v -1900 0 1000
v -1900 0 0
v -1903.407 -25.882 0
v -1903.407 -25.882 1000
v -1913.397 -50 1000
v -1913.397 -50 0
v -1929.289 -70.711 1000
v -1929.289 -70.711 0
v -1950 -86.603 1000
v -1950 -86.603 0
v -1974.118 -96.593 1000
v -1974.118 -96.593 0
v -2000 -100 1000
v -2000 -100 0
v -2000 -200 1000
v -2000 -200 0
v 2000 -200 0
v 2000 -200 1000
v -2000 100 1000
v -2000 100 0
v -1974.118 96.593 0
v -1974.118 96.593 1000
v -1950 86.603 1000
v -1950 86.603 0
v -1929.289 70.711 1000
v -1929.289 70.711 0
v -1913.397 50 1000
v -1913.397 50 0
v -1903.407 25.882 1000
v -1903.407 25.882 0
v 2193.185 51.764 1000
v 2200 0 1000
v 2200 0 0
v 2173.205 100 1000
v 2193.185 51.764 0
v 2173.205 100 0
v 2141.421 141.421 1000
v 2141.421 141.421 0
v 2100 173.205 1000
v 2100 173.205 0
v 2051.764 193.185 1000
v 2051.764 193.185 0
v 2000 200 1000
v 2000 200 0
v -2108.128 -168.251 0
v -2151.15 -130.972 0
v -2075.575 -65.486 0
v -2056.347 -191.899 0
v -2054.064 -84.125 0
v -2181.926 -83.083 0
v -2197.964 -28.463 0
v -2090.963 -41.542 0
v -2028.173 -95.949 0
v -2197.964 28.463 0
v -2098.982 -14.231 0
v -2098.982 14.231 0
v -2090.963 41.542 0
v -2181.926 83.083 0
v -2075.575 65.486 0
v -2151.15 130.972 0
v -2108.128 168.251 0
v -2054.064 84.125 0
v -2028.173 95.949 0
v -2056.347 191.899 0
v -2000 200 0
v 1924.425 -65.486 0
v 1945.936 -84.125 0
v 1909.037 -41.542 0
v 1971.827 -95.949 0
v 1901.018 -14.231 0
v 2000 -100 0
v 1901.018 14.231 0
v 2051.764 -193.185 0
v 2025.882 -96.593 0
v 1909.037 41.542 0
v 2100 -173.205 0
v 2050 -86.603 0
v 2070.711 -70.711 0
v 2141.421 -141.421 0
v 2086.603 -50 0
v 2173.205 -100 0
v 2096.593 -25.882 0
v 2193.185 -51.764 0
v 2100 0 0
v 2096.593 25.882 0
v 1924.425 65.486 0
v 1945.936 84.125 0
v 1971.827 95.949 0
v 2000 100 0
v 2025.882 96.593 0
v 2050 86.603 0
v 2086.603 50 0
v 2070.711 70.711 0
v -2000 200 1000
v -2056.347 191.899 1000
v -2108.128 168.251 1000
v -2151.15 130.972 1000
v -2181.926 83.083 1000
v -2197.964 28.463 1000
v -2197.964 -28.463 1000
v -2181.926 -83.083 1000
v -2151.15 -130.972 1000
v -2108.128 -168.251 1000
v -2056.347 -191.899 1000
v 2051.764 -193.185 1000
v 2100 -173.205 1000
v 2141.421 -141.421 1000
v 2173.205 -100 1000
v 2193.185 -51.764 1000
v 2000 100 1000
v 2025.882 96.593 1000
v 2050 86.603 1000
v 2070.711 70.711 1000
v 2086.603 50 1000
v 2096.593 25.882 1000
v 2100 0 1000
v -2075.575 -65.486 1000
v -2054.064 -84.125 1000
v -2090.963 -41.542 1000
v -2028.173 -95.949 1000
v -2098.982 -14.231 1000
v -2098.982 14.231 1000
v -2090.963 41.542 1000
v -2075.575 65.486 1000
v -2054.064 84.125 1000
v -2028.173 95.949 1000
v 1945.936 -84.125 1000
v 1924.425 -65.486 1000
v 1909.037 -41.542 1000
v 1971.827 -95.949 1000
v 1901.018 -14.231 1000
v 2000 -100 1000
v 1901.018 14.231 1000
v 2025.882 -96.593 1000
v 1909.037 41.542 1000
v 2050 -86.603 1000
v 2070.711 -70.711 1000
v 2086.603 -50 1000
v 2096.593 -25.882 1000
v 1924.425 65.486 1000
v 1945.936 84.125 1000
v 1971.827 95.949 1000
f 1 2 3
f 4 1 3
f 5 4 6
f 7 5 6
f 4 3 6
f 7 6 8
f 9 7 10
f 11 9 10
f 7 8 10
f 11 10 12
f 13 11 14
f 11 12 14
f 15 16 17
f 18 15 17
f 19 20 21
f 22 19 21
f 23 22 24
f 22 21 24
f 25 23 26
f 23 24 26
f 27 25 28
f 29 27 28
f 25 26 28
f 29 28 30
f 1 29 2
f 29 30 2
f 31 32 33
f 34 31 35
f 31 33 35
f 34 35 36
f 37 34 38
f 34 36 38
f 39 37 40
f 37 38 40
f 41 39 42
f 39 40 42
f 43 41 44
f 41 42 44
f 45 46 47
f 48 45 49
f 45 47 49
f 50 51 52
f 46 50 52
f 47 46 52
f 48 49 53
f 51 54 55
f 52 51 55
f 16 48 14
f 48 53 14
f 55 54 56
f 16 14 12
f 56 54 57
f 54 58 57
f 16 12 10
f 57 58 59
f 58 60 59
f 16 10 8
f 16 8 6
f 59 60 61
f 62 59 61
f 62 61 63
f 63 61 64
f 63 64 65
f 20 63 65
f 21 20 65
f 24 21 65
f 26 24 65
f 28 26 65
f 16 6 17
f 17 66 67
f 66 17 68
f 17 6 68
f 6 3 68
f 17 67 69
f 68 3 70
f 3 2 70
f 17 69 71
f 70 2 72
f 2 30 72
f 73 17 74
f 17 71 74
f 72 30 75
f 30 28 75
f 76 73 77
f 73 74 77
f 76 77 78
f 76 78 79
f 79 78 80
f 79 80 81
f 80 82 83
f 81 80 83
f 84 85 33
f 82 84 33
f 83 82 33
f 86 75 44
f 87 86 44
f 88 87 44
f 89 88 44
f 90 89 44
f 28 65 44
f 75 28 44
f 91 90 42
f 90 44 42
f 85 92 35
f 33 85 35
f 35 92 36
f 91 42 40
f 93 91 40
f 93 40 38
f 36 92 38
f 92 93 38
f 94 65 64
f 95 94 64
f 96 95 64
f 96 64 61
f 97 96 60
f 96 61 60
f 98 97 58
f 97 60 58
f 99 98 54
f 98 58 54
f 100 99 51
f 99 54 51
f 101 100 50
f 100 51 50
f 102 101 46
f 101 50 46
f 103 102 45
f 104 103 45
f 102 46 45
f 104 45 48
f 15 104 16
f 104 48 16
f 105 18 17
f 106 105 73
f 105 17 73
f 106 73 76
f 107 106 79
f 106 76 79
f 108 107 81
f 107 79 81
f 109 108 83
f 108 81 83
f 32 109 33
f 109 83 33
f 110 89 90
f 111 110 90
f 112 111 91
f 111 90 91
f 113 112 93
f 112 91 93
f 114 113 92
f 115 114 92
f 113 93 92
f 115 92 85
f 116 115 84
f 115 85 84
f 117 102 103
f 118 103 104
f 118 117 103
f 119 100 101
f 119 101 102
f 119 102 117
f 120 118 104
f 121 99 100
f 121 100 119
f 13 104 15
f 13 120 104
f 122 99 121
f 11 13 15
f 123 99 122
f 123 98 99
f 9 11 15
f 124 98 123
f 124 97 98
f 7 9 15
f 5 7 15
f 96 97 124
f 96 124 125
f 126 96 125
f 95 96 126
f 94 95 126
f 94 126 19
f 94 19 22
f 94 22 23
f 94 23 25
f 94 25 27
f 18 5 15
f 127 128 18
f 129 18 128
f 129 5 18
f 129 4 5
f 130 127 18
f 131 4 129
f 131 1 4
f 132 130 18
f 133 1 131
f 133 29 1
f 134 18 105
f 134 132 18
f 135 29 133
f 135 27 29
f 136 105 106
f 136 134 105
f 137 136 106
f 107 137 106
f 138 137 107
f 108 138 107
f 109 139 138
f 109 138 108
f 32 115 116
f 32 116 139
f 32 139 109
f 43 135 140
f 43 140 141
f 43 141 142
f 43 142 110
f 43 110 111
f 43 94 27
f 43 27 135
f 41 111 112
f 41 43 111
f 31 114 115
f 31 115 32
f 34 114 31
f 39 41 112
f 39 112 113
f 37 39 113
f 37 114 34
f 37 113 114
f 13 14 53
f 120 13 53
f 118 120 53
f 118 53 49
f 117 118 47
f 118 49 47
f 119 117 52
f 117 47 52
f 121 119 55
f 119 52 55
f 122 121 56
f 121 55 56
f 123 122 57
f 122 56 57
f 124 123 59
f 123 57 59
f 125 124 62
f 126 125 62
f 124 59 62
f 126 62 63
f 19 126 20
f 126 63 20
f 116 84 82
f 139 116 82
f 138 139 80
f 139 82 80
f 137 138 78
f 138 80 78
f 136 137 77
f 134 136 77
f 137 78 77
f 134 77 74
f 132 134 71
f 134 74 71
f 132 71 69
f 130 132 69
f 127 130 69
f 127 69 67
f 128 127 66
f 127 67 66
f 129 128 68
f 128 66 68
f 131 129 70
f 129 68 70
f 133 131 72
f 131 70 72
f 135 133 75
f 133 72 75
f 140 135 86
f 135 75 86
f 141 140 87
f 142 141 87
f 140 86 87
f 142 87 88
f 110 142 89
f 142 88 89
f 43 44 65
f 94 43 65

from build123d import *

# Parameters (mm, degrees)
EXTRUDE_1_DEPTH = 1000


with BuildPart() as part:
    # ｽｹｯﾁ1 → ﾎﾞｽ - 押し出し1 (new body)
    with BuildSketch(Plane.XY):
        with BuildLine():
            ThreePointArc((-2000, 200), (-2200, 0), (-2000, -200))
            Line((-2000, -200), (-2000, -100))
            ThreePointArc((-2000, -100), (-2100, 0), (-2000, 100))
            Line((-2000, 100), (-2000, 200))
        make_face()
        with BuildLine():
            Line((-2000, -100), (-2000, -200))
            ThreePointArc((-2000, -200), (-1858.578643763, -141.421356237), (-1800, 0))
            ThreePointArc((-1800, 0), (-1858.578643763, 141.421356237), (-2000, 200))
            Line((-2000, 200), (-2000, 100))
            ThreePointArc((-2000, 100), (-1929.289321881, 70.710678119), (-1900, 0))
            ThreePointArc((-1900, 0), (-1929.289321881, -70.710678119), (-2000, -100))
        make_face()
        with BuildLine():
            ThreePointArc((-1800, 0), (-1858.578643763, -141.421356237), (-2000, -200))
            Line((-2000, -200), (2000, -200))
            ThreePointArc((2000, -200), (1800, 0), (2000, 200))
            Line((2000, 200), (-2000, 200))
            ThreePointArc((-2000, 200), (-1858.578643763, 141.421356237), (-1800, 0))
        make_face()
        with BuildLine():
            ThreePointArc((2000, 200), (1800, 0), (2000, -200))
            Line((2000, -200), (2000, -100))
            ThreePointArc((2000, -100), (1900, 0), (2000, 100))
            Line((2000, 100), (2000, 200))
        make_face()
        with BuildLine():
            Line((2000, -100), (2000, -200))
            ThreePointArc((2000, -200), (2141.421356237, -141.421356237), (2200, 0))
            ThreePointArc((2200, 0), (2141.421356237, 141.421356237), (2000, 200))
            Line((2000, 200), (2000, 100))
            ThreePointArc((2000, 100), (2070.710678119, 70.710678119), (2100, 0))
            ThreePointArc((2100, 0), (2070.710678119, -70.710678119), (2000, -100))
        make_face()
    extrude(amount=EXTRUDE_1_DEPTH)


solid = part.part
